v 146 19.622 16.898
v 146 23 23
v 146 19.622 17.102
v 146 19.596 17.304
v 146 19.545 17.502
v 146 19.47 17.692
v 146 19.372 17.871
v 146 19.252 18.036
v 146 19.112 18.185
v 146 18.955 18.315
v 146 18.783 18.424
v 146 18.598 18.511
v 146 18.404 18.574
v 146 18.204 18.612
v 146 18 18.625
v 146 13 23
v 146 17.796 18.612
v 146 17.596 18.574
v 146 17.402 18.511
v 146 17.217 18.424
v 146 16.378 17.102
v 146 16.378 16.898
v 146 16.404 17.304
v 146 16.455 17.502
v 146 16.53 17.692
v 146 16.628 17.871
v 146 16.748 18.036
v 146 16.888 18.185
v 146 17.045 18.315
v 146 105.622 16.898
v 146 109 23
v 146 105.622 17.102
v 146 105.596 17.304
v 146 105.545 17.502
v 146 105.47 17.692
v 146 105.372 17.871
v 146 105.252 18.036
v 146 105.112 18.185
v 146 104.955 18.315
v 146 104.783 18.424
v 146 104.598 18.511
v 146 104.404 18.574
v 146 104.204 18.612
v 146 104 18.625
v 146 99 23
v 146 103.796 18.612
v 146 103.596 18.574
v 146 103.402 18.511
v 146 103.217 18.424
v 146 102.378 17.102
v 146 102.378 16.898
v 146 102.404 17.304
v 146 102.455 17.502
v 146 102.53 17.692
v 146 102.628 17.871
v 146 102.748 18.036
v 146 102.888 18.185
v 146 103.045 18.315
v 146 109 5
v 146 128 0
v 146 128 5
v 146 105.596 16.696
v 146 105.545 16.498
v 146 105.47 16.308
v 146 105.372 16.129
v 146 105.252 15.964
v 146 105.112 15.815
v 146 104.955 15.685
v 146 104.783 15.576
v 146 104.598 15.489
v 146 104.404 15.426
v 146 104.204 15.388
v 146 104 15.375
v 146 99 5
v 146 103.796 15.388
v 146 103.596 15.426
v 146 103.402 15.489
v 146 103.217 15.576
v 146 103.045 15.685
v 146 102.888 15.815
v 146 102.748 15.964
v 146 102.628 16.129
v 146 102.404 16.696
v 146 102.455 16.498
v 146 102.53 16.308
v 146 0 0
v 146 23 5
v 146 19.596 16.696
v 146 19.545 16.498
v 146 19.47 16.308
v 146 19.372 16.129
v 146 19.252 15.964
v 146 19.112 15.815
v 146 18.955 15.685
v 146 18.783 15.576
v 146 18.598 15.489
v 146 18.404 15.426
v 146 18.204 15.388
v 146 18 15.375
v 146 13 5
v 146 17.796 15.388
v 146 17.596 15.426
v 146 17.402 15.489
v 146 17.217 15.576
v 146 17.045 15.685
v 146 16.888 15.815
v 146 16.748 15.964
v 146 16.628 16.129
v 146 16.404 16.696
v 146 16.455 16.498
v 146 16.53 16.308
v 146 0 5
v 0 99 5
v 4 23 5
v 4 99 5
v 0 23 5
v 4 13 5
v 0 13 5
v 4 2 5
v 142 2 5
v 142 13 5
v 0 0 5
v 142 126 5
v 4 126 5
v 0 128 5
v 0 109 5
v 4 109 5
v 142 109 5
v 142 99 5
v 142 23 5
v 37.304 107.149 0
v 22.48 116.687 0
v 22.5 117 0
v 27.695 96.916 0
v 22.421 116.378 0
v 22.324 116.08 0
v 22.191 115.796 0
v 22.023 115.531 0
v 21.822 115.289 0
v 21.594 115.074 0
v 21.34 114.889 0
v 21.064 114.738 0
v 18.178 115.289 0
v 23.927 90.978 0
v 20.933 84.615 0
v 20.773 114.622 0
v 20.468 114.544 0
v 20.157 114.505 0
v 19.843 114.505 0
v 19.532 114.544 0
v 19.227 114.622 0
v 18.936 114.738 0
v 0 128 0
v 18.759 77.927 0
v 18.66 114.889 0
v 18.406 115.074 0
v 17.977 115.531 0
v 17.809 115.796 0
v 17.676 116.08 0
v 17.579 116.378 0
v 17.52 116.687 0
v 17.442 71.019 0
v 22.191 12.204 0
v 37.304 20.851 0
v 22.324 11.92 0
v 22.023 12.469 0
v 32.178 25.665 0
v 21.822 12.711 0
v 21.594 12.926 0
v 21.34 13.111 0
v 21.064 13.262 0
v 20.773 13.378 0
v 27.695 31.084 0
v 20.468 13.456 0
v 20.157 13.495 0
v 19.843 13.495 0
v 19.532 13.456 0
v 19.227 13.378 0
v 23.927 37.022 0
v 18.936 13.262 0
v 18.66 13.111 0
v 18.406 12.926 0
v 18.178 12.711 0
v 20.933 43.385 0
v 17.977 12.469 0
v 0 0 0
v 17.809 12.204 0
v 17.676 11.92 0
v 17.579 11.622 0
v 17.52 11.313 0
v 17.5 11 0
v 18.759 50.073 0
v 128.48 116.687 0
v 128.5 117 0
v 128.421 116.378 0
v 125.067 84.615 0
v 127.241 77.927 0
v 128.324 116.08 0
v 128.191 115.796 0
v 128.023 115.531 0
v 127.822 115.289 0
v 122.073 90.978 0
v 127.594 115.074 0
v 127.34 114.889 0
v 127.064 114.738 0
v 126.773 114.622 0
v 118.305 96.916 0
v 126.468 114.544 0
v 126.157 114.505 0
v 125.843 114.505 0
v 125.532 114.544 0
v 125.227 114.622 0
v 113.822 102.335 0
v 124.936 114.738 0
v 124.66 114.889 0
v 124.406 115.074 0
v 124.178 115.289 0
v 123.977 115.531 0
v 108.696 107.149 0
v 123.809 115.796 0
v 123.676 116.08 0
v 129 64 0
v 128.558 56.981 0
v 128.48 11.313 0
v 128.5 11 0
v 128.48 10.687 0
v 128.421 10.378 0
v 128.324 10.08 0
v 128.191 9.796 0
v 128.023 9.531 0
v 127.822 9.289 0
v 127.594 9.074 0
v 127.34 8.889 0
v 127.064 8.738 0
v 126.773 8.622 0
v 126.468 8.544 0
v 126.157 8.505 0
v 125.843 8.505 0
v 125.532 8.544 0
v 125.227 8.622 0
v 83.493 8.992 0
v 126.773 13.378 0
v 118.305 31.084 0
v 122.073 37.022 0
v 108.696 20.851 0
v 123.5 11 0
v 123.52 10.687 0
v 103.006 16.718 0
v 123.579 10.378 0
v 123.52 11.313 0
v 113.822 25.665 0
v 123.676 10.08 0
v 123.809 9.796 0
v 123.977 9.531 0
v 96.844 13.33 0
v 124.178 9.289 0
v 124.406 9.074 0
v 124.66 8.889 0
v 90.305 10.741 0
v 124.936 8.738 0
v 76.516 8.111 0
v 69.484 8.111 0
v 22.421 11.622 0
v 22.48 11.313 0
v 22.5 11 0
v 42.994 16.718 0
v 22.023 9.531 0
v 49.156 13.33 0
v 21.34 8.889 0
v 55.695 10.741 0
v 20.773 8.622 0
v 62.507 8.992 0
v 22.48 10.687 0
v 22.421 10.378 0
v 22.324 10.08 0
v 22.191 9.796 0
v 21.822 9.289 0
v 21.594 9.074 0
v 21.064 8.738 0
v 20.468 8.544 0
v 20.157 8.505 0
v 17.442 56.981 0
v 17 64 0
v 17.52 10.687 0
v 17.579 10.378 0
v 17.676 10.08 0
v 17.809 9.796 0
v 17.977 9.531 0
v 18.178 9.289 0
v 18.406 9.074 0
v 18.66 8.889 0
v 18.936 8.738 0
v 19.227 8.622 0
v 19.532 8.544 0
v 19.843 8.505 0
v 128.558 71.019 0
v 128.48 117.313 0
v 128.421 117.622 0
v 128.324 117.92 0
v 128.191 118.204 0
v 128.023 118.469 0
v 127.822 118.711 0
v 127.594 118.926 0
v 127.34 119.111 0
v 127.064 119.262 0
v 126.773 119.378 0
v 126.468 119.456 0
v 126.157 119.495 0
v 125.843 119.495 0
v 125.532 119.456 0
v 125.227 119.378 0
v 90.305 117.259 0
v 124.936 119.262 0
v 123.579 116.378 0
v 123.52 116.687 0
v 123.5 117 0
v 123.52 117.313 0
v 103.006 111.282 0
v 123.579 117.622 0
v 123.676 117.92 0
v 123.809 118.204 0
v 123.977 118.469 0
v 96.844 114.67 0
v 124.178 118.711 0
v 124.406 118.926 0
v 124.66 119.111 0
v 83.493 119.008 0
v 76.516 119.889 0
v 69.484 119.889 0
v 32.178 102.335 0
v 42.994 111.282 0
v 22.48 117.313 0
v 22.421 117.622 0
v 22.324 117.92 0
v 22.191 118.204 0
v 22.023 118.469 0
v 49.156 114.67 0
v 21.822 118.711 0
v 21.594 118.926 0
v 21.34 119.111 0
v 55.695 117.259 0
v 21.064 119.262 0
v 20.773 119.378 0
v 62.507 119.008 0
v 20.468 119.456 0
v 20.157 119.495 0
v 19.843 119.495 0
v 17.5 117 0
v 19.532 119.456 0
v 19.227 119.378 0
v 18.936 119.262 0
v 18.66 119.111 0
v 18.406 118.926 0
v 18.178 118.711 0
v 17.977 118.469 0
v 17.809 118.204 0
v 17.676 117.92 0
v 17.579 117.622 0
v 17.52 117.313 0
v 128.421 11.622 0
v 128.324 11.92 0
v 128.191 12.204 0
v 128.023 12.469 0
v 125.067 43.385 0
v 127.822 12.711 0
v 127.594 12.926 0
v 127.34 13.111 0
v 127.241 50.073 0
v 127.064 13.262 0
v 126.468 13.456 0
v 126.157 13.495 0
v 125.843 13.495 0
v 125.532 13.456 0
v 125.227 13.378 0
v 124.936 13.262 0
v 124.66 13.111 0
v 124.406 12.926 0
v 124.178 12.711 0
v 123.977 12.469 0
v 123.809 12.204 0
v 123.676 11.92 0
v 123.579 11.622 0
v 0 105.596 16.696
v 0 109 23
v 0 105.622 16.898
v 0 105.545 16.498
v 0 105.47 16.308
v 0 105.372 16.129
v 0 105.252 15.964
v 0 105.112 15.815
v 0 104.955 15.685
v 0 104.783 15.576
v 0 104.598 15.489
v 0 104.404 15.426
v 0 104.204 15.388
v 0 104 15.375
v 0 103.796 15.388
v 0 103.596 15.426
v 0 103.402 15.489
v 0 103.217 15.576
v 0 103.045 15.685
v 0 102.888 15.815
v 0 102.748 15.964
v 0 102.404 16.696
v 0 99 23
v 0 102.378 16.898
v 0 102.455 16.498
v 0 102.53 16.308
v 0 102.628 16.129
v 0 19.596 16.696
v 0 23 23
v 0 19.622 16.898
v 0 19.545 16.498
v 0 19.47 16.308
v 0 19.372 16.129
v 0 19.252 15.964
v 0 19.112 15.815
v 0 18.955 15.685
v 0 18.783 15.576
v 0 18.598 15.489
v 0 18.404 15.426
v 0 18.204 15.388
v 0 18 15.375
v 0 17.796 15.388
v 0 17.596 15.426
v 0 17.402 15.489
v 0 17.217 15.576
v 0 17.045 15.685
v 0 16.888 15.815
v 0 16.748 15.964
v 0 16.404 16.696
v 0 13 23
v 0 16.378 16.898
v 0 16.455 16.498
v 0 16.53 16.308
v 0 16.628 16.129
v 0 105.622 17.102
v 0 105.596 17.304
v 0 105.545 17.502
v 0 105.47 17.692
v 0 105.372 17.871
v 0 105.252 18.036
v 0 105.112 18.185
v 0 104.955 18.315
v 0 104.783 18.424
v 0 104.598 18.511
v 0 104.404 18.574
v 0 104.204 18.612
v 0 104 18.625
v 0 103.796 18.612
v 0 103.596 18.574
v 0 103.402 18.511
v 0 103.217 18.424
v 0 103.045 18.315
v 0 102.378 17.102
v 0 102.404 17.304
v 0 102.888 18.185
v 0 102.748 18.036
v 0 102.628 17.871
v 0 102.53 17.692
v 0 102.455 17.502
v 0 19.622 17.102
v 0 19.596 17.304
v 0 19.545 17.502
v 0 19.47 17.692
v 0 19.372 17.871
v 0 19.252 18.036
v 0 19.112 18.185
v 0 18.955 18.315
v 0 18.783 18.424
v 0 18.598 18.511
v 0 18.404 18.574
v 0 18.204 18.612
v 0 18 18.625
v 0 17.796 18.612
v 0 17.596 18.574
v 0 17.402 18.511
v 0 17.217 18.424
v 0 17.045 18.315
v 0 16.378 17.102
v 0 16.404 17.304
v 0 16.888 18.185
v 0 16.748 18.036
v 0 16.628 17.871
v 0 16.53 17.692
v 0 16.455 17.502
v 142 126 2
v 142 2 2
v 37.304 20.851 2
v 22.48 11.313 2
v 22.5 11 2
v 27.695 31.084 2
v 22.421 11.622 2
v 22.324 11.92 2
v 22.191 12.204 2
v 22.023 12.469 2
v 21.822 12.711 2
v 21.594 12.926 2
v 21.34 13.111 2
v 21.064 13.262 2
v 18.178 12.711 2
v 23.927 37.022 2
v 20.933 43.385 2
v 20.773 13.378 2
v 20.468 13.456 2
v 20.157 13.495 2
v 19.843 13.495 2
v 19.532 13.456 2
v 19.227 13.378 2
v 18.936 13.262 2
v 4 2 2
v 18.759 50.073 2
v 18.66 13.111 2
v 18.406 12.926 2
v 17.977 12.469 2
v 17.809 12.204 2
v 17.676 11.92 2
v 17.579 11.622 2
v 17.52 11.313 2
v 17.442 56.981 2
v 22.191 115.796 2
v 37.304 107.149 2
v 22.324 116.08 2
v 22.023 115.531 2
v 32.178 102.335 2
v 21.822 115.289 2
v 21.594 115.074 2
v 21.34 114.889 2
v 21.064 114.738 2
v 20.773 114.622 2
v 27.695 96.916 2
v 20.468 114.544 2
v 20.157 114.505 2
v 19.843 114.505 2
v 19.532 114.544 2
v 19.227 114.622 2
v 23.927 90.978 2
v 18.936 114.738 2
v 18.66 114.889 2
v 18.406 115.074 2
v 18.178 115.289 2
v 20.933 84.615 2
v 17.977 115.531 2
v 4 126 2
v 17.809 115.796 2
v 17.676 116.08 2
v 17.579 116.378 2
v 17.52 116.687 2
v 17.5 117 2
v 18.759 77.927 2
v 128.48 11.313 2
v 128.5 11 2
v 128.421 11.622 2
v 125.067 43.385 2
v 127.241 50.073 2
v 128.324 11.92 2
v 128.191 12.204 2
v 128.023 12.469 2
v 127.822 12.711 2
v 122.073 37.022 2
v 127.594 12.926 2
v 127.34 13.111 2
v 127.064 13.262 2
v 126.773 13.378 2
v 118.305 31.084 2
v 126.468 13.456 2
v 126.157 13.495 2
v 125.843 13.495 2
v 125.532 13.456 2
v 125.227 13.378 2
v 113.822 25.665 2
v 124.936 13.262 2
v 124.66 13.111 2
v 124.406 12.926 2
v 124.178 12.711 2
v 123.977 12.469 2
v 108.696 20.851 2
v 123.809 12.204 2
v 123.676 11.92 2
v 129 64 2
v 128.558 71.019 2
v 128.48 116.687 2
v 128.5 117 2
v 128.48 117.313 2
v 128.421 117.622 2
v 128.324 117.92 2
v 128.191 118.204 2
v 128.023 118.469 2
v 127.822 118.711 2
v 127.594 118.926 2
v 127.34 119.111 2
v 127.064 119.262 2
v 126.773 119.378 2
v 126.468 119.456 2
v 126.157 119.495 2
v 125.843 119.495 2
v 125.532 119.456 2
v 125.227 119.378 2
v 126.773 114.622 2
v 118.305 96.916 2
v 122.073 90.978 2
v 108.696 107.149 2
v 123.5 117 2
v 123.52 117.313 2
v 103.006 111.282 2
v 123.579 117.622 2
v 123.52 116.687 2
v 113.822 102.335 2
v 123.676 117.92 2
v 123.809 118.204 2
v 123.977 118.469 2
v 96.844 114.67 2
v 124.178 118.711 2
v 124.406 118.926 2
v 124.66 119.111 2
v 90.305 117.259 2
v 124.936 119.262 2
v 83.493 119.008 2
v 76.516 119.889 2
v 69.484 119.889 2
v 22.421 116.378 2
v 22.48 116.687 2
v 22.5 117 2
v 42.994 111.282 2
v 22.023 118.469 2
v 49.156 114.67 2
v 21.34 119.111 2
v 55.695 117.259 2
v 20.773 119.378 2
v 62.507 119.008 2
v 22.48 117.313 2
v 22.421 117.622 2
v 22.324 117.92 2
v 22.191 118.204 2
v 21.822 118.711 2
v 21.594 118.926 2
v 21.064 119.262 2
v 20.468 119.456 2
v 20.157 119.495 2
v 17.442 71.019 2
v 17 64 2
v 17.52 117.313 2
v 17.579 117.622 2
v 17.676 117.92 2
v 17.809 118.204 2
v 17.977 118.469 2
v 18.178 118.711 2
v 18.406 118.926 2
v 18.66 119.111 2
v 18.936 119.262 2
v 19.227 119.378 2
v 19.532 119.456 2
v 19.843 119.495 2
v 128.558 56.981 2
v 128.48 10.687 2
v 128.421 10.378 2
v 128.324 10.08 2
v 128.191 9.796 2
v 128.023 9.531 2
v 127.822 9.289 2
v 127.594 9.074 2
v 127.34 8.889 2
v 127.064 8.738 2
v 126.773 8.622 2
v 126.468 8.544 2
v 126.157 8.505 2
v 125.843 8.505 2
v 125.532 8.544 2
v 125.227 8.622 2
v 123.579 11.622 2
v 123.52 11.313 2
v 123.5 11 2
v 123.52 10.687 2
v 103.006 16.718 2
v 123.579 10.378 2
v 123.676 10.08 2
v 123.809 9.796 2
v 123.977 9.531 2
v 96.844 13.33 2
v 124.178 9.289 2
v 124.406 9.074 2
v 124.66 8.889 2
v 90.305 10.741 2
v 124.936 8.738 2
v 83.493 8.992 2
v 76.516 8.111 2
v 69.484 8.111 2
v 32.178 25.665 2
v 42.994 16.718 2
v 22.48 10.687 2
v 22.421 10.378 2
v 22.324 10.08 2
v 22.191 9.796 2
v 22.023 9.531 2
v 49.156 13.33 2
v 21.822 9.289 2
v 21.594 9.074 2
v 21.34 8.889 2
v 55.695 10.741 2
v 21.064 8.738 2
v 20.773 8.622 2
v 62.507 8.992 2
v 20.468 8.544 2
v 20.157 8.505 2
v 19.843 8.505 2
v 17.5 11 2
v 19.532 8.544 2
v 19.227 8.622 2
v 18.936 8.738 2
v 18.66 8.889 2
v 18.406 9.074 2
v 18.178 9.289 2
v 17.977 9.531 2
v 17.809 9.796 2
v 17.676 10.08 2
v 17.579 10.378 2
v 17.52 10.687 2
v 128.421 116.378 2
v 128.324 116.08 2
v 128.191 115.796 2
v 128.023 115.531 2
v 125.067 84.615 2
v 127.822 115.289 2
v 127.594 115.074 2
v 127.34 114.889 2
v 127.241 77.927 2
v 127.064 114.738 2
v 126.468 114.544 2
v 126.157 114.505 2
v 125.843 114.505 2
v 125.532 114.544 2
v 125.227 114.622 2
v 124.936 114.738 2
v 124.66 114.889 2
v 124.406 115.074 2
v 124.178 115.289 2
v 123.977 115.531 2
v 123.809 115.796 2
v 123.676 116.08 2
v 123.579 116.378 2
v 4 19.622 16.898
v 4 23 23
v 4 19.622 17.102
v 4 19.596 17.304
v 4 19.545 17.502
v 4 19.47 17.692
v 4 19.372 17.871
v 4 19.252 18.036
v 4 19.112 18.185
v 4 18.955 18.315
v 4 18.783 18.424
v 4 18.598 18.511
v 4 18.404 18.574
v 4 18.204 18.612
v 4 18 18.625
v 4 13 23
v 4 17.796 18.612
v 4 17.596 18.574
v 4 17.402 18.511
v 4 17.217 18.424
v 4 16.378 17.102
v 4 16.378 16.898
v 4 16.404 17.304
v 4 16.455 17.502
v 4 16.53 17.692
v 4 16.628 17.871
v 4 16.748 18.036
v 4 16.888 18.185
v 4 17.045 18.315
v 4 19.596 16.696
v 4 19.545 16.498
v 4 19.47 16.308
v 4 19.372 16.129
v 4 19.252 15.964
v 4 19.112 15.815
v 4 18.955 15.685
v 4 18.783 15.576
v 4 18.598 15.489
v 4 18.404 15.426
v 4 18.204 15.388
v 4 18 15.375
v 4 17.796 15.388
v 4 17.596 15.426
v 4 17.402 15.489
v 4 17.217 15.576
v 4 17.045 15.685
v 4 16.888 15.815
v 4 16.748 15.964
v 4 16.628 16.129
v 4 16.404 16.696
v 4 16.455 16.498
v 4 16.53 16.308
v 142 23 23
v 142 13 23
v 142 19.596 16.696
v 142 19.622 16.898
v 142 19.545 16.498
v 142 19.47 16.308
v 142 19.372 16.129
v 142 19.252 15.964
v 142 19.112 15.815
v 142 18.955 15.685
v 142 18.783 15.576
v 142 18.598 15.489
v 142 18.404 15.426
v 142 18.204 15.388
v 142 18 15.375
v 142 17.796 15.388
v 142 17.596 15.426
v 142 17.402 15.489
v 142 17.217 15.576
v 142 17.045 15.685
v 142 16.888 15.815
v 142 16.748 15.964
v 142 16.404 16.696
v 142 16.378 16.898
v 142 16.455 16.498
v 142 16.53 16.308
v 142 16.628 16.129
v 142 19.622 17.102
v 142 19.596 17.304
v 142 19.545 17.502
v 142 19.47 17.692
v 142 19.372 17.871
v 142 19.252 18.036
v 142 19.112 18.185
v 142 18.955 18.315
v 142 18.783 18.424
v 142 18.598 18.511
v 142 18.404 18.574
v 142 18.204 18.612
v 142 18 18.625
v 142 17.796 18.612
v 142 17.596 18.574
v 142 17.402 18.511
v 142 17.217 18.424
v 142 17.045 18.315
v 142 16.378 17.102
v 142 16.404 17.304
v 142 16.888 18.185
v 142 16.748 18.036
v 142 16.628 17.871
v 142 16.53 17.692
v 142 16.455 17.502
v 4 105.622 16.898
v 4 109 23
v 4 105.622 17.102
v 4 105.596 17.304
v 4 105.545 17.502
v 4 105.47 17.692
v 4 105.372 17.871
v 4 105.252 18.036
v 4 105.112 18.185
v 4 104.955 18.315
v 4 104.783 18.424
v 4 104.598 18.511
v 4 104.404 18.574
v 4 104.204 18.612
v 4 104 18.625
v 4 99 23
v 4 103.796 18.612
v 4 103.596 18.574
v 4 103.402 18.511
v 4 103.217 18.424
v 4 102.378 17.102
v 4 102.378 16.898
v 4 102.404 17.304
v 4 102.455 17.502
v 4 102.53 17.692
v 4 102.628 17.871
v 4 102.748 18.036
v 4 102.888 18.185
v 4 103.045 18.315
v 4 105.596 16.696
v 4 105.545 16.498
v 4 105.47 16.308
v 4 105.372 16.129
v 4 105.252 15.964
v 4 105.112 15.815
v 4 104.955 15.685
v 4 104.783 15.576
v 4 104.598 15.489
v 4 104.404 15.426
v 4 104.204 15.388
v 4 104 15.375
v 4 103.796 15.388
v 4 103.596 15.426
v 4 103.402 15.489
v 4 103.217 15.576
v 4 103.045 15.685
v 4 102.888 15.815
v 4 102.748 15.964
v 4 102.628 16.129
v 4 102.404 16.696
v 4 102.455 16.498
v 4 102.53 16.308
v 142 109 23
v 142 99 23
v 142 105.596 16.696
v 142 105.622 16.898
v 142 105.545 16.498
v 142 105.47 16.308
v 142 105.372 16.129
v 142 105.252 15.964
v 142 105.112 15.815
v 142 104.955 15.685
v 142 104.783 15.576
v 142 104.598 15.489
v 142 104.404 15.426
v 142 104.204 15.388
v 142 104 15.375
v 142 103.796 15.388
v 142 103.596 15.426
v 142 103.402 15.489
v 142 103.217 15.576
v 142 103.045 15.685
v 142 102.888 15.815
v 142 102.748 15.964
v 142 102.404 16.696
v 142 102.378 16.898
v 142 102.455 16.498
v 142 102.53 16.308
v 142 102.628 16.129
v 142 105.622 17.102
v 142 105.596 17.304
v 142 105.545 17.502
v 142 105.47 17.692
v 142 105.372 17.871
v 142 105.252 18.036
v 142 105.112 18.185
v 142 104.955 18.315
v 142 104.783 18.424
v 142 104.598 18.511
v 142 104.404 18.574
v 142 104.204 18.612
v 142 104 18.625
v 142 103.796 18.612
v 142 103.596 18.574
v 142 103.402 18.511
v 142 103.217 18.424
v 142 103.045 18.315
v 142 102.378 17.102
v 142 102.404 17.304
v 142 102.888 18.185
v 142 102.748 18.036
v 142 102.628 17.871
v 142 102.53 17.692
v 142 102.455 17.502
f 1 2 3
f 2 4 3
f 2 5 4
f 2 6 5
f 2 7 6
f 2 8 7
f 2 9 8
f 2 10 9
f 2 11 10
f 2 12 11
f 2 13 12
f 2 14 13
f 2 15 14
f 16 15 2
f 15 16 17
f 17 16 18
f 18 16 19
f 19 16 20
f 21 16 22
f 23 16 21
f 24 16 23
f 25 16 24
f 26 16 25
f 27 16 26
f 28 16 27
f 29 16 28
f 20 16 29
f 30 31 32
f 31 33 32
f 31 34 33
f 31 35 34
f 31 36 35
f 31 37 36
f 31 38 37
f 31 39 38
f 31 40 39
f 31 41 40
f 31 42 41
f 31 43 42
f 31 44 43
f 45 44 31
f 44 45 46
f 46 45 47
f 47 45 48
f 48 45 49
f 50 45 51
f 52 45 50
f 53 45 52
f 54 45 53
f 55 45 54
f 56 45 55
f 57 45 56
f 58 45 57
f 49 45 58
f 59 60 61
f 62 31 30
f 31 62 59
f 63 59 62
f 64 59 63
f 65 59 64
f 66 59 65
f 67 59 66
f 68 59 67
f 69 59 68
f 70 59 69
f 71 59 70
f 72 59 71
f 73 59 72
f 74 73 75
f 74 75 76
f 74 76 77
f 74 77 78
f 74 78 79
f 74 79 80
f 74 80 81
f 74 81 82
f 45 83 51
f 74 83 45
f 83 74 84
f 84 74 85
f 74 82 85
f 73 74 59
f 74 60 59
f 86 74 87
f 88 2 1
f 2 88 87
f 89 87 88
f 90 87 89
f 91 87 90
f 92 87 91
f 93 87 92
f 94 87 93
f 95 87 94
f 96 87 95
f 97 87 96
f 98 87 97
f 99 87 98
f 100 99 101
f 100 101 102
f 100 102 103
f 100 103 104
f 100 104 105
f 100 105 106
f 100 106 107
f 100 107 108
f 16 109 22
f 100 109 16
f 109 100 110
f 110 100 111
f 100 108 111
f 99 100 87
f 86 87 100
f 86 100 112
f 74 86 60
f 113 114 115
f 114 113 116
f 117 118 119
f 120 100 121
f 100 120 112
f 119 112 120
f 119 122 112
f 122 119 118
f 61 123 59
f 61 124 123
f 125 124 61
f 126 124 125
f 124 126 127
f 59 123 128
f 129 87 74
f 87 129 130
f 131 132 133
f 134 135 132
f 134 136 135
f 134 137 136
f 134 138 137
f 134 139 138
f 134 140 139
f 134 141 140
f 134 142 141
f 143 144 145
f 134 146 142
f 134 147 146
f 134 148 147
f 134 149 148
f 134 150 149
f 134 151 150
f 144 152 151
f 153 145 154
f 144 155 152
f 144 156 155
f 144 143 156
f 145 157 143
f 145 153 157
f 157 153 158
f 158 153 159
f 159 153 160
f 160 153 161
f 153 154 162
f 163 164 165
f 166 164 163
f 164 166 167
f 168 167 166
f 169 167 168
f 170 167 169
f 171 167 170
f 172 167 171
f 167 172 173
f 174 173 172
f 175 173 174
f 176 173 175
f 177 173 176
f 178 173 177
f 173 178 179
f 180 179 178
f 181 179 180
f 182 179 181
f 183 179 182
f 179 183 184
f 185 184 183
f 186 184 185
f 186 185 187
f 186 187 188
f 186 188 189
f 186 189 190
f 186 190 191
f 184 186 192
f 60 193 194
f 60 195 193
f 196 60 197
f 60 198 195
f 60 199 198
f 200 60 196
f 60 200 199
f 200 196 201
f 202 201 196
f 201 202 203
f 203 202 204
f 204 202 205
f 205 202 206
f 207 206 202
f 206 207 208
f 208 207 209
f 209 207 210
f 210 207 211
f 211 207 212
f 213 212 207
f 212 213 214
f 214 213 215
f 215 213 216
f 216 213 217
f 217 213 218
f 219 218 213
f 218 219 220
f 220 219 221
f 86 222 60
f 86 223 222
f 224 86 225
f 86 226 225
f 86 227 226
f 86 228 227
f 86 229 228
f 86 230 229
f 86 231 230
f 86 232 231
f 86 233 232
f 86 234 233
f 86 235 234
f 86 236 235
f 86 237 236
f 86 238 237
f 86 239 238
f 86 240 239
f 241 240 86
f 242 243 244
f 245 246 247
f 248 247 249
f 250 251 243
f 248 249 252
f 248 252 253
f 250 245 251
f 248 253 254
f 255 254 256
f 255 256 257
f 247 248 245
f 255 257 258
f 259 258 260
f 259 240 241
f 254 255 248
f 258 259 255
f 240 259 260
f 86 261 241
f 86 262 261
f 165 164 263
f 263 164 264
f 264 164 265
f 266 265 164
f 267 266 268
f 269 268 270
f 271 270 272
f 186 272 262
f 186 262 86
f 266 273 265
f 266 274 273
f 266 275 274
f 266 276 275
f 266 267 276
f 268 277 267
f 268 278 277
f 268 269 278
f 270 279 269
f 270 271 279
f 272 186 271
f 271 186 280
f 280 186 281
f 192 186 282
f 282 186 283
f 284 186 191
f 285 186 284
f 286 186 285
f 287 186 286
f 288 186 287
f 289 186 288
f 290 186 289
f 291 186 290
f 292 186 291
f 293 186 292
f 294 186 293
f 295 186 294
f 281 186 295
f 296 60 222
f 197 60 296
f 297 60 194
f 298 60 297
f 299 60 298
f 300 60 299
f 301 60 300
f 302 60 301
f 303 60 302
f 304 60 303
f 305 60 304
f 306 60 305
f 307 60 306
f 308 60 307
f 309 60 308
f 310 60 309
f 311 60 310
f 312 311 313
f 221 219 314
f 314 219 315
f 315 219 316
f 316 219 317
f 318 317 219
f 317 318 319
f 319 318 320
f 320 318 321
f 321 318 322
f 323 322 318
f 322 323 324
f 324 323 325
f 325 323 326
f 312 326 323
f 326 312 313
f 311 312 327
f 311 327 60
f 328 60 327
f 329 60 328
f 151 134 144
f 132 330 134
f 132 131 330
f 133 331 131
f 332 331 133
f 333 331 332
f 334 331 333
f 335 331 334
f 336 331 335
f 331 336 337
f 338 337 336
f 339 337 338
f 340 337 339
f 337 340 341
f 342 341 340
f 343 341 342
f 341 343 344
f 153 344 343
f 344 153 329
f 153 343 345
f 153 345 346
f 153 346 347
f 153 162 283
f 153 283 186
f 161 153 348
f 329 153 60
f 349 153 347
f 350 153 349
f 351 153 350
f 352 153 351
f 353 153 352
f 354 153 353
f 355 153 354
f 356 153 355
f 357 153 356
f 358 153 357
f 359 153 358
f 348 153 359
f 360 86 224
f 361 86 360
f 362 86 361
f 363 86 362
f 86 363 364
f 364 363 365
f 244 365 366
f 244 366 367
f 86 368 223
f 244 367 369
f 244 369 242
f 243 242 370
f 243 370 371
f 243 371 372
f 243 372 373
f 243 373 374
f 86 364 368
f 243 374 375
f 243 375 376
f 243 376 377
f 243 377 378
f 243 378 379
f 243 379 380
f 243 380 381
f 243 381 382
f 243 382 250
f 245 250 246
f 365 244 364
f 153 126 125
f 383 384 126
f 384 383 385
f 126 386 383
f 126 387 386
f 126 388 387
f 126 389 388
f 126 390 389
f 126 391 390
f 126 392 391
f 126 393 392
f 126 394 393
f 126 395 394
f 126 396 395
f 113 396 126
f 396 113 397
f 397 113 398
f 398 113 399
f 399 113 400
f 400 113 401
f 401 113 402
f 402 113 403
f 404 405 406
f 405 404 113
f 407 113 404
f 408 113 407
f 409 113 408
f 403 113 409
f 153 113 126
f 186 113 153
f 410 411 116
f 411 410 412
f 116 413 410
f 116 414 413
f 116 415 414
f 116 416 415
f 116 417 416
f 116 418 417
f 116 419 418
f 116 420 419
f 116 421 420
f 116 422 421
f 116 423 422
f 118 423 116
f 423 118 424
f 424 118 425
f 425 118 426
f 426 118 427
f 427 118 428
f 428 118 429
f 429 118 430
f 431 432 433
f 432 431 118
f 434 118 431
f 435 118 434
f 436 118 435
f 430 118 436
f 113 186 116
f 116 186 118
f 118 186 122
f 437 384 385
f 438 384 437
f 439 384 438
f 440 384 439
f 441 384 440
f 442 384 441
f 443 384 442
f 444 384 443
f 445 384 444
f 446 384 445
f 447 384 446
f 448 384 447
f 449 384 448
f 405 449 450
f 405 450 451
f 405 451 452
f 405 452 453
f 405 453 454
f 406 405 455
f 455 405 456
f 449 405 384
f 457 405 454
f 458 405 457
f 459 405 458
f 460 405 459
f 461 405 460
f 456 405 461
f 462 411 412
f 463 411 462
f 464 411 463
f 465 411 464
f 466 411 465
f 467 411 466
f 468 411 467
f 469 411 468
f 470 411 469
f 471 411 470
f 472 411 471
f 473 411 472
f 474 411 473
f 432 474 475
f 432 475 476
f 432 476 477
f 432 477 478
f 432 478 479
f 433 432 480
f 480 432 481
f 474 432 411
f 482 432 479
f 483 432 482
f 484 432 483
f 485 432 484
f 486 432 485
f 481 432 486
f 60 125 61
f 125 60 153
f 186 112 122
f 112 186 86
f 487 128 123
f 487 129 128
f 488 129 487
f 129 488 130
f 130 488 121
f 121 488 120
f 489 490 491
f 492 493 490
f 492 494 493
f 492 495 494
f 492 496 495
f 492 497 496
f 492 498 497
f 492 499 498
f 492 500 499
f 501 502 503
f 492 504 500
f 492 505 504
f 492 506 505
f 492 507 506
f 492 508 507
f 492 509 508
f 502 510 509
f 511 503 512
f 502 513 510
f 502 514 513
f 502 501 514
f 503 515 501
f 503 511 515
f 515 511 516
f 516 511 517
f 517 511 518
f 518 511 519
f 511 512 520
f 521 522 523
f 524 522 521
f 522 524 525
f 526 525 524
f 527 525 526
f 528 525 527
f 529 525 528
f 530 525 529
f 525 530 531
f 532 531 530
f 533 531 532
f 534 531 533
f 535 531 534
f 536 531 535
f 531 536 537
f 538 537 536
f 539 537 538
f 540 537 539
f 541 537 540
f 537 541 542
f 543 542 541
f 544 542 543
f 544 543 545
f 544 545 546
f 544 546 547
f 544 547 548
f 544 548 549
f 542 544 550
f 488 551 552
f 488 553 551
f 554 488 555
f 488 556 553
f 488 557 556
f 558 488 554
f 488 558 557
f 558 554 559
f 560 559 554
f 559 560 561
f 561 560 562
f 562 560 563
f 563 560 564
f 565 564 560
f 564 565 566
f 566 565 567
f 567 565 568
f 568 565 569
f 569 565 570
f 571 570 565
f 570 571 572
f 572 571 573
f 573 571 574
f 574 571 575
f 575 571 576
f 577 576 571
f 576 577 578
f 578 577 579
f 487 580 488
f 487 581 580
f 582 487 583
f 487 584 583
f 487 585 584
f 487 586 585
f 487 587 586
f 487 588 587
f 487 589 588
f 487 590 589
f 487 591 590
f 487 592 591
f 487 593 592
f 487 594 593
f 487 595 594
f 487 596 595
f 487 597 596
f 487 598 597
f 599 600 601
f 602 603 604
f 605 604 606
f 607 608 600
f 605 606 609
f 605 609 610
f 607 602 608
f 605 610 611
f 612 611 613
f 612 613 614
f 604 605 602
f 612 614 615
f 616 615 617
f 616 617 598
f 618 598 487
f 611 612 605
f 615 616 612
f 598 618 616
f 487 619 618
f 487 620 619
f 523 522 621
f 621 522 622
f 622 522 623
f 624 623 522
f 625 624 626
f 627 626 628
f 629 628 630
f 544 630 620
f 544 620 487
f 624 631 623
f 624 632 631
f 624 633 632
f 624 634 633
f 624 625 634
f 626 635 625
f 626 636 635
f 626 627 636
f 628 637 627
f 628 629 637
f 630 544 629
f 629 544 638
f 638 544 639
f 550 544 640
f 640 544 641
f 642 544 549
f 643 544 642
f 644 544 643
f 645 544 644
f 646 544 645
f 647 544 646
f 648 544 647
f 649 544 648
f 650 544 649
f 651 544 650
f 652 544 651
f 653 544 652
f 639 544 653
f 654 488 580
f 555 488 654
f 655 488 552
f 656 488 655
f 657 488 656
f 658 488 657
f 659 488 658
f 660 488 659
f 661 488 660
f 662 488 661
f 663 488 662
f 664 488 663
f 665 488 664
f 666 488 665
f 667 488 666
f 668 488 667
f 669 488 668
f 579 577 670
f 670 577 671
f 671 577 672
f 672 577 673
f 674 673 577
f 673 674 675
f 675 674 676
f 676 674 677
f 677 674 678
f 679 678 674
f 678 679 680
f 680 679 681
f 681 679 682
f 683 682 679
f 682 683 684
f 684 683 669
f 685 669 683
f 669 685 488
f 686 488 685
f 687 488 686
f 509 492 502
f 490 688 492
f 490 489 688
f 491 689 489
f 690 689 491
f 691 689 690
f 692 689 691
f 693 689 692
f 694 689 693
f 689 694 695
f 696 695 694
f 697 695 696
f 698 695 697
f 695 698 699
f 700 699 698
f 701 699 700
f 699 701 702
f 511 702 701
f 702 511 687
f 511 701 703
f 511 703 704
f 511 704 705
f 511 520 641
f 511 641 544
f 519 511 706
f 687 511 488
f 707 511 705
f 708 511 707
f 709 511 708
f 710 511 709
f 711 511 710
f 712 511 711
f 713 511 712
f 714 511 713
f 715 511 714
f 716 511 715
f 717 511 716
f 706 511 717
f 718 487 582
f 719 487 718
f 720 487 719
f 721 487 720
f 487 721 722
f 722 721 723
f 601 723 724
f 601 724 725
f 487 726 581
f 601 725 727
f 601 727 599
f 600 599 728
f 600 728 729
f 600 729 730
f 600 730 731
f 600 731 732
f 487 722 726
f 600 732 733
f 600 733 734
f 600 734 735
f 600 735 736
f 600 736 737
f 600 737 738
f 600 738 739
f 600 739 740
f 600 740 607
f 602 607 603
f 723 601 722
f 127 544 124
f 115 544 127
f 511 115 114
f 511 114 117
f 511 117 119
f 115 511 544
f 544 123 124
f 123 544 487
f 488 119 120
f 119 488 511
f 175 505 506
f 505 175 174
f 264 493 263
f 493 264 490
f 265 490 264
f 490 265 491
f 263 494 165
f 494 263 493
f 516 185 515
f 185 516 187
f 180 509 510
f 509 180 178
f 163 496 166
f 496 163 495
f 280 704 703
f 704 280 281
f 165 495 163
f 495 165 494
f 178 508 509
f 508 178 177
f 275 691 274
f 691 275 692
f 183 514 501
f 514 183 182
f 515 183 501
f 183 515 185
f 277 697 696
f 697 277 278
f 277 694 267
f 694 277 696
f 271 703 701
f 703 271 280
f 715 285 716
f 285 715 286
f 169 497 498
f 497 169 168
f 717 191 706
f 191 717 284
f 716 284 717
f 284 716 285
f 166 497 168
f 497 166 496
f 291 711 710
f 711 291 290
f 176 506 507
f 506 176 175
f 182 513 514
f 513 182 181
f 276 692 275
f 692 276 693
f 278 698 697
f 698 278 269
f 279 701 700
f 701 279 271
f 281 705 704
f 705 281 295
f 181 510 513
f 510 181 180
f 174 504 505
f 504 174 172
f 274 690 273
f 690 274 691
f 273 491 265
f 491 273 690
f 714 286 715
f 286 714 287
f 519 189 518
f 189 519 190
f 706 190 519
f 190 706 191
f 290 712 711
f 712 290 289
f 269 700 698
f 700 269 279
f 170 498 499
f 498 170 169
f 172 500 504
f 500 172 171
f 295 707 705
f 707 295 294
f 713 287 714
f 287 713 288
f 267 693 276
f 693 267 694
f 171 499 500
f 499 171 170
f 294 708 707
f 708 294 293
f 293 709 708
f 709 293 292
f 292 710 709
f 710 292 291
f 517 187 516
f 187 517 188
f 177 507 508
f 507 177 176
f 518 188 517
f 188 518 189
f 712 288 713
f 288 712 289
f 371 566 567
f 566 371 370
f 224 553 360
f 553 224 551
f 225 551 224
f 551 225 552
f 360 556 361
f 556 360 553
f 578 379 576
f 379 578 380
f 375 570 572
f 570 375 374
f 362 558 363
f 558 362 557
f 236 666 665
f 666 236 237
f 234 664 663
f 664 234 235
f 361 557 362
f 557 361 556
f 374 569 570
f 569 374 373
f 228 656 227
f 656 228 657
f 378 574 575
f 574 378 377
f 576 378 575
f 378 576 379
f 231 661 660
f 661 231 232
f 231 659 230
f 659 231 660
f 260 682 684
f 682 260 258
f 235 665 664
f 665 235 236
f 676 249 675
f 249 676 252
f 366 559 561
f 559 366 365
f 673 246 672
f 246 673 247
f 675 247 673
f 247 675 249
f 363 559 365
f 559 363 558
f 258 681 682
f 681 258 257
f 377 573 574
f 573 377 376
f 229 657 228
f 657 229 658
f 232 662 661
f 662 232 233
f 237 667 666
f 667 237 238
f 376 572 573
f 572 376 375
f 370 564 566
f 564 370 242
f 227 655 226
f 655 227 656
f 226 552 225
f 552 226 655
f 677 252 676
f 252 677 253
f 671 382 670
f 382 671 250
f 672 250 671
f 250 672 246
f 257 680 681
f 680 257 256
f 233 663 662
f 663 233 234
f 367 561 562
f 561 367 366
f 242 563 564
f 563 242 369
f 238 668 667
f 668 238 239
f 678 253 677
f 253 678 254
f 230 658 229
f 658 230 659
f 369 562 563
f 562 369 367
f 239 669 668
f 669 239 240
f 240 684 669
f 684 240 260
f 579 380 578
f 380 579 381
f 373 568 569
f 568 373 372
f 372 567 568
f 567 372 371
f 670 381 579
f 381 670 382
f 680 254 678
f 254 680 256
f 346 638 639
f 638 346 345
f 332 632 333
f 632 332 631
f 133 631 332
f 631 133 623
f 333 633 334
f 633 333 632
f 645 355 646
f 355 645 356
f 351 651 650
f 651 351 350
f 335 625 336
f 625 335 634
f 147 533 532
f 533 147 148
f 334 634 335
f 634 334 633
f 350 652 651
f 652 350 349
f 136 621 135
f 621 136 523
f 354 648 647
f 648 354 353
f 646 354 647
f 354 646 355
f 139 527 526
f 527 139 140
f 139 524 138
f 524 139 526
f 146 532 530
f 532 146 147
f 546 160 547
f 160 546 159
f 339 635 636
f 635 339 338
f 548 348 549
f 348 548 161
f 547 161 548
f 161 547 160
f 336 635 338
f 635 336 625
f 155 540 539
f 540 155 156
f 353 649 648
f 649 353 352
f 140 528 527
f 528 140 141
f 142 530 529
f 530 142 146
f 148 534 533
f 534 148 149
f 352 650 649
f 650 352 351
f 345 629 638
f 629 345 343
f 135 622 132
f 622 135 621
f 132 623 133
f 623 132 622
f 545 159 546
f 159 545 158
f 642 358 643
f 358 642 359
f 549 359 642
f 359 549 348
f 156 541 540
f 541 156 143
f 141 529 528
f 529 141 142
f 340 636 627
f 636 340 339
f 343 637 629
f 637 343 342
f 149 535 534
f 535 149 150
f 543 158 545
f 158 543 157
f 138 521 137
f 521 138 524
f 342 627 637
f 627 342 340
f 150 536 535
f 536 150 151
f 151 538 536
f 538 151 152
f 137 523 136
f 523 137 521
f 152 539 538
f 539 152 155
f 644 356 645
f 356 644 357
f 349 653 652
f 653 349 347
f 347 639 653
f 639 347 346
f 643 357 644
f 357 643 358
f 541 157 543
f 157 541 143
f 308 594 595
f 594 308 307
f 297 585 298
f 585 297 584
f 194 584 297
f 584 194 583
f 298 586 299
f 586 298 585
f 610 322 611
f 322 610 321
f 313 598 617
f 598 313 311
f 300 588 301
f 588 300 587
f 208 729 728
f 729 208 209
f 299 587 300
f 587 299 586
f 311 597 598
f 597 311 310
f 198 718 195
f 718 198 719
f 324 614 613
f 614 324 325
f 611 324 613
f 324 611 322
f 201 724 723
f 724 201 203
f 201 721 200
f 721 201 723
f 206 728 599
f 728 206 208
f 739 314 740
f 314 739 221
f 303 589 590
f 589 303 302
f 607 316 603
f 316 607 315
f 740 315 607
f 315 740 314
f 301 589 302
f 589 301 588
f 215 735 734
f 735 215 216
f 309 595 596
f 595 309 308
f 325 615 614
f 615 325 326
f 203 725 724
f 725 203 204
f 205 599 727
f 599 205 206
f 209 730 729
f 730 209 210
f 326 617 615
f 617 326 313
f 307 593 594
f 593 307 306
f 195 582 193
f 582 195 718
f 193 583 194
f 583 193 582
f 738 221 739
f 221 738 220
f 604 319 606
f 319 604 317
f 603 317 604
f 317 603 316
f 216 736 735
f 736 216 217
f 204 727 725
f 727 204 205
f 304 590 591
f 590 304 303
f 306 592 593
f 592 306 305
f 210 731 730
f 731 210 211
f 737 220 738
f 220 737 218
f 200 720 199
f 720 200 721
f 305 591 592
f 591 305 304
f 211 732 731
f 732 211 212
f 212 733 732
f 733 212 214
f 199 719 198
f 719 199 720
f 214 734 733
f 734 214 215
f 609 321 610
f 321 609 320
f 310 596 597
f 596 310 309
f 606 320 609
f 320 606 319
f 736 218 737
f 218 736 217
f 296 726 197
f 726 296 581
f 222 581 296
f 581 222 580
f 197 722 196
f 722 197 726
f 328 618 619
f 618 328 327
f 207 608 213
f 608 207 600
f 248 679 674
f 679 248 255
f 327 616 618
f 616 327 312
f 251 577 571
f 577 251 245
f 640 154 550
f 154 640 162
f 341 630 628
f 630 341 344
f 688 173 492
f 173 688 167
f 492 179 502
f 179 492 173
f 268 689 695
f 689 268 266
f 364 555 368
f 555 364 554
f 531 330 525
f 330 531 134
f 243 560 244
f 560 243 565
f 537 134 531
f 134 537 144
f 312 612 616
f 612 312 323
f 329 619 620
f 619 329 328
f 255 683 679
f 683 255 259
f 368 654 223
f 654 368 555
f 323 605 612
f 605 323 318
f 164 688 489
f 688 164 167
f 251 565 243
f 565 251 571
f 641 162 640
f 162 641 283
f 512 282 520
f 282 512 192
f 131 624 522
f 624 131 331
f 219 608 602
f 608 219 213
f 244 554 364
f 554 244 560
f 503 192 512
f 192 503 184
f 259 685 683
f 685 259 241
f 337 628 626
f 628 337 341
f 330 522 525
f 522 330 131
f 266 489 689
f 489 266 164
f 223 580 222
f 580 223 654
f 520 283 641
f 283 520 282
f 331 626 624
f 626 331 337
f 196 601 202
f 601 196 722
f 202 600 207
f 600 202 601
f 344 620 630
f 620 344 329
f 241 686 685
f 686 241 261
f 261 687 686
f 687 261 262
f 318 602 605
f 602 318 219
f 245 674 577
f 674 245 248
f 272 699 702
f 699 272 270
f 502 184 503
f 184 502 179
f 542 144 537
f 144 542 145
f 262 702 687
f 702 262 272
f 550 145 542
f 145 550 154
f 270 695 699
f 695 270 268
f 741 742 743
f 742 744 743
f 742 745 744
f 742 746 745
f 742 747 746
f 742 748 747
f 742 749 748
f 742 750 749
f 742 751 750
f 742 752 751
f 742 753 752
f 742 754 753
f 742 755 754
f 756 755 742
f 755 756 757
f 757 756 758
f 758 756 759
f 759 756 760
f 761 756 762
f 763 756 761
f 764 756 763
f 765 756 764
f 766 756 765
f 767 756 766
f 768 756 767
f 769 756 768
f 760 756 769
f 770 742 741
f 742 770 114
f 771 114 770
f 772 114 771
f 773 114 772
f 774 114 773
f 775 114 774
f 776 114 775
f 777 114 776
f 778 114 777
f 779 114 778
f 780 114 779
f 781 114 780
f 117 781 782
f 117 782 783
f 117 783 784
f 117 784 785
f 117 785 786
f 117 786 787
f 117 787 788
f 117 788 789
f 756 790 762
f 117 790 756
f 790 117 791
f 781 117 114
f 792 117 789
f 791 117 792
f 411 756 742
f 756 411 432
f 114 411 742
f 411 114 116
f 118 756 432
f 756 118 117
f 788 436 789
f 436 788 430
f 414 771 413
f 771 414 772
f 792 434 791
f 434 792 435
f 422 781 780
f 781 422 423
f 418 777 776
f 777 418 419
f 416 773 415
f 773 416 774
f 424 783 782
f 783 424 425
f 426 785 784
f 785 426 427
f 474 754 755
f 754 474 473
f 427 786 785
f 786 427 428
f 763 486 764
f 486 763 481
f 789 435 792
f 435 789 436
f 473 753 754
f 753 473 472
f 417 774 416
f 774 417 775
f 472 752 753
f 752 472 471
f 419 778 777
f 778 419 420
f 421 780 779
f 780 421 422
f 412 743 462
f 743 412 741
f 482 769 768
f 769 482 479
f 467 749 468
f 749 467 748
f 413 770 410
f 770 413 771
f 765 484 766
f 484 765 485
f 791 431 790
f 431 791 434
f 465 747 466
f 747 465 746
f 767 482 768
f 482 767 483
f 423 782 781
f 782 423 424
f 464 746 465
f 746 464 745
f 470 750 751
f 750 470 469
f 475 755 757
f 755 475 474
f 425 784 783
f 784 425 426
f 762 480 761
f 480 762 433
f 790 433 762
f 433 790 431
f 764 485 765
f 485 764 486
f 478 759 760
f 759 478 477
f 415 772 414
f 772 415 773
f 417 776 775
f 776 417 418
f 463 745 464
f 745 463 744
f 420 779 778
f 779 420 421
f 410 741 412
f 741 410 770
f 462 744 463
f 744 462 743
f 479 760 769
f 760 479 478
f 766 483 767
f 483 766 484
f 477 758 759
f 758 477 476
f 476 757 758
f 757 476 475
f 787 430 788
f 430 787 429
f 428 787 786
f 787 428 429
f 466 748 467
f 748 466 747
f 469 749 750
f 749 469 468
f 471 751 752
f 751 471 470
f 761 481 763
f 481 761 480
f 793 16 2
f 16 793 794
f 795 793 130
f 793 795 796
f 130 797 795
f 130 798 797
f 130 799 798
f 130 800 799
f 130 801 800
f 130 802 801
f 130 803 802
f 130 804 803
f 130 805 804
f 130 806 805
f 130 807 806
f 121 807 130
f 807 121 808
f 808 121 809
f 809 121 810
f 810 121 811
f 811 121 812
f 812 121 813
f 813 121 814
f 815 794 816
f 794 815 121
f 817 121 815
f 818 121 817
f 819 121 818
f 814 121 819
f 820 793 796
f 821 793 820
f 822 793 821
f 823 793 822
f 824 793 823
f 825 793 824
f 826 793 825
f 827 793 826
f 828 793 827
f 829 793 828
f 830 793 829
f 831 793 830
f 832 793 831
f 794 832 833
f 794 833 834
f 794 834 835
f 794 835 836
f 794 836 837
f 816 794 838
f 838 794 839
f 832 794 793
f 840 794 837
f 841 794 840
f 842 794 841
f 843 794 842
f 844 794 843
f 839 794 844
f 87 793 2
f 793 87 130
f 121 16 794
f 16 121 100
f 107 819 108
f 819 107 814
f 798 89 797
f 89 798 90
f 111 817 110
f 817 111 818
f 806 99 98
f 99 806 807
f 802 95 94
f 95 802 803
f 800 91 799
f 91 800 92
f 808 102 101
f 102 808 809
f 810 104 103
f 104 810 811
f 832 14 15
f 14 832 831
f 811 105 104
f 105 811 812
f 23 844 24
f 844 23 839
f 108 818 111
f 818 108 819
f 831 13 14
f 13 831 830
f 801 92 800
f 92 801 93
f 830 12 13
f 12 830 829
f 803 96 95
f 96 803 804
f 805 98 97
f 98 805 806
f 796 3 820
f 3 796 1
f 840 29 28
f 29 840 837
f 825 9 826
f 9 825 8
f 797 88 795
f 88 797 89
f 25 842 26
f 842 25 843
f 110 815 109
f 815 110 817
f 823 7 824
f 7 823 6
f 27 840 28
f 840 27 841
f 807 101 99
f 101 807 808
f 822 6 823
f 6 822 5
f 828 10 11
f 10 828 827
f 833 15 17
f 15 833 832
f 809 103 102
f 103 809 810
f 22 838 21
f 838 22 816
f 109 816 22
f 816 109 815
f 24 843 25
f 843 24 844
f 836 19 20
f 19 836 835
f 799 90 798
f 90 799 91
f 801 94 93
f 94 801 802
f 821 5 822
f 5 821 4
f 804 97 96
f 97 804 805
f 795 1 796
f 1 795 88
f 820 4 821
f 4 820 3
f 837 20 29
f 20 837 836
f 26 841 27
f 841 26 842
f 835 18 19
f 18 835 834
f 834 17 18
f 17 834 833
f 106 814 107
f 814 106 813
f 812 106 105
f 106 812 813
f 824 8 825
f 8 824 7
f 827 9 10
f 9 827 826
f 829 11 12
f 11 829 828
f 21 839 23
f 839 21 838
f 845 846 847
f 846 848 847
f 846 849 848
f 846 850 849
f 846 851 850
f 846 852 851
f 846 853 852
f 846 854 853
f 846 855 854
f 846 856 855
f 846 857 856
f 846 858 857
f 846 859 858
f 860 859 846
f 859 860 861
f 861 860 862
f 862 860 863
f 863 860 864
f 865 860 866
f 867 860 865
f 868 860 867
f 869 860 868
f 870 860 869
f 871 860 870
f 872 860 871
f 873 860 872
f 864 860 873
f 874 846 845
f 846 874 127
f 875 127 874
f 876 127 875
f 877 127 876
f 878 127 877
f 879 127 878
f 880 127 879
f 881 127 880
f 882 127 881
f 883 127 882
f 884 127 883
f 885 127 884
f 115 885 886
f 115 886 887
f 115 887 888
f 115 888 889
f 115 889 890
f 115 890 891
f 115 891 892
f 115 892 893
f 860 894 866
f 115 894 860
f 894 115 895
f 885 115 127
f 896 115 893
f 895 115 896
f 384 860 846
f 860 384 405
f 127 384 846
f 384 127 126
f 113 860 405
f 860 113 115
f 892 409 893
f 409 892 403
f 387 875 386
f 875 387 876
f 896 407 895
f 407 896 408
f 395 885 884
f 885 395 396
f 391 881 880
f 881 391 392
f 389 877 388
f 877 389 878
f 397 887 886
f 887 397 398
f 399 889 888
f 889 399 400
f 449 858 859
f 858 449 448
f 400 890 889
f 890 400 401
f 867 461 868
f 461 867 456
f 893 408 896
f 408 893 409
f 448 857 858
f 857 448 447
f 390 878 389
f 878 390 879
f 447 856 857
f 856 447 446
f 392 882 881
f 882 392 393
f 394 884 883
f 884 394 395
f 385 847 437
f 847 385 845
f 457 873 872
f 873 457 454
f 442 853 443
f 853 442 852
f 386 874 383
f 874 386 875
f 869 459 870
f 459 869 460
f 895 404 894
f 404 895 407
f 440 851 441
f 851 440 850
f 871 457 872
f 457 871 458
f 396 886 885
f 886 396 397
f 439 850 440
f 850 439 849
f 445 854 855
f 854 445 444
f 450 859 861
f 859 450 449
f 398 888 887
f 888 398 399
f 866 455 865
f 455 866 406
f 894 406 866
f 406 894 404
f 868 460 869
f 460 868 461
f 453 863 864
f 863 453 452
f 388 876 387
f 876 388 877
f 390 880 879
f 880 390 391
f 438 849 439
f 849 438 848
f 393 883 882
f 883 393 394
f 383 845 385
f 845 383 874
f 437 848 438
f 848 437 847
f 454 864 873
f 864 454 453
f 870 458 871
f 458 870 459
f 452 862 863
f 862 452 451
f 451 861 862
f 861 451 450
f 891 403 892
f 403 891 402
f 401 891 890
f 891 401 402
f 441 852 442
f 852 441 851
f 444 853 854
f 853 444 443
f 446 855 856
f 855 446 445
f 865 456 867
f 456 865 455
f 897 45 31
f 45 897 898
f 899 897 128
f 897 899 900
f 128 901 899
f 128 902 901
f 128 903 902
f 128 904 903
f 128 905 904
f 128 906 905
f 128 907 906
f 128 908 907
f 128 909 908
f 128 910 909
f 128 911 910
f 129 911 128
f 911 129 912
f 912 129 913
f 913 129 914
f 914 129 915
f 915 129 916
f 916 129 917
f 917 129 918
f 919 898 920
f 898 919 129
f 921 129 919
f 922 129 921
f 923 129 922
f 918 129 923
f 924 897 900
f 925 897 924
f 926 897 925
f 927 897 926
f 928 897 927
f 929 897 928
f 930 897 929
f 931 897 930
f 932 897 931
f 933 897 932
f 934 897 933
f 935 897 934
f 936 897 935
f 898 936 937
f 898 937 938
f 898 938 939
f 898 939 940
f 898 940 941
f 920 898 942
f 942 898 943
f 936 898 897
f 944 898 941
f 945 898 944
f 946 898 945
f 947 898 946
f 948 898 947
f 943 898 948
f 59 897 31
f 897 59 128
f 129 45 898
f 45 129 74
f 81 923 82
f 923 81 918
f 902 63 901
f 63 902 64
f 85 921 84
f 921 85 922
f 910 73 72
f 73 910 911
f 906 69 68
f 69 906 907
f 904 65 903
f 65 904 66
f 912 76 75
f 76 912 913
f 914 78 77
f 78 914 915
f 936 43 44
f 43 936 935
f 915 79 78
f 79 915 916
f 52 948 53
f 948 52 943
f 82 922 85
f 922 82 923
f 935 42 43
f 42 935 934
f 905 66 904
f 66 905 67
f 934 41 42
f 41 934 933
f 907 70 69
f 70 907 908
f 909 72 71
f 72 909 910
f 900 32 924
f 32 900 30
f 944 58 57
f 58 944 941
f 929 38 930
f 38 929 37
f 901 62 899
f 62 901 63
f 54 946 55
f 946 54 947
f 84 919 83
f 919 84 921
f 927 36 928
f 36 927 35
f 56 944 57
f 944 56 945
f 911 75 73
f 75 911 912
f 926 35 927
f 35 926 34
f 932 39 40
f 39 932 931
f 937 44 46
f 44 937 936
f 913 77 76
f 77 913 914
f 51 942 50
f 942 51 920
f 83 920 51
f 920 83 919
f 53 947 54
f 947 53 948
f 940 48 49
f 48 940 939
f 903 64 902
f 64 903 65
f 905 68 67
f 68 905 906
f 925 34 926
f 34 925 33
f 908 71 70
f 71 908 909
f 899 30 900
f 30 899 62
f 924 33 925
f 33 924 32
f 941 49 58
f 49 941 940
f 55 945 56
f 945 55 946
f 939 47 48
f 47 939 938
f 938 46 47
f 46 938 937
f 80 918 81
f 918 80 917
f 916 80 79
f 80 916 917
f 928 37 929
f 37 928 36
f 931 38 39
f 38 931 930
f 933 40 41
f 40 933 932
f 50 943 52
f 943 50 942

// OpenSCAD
fanw=146;//bracket width
fanh=128;//bracket height
fant=2;//bracket thickness
fanet=5;//bracket edge thickness
fanew=4;//bracket edge width
faneh=2;//bracket edge height
fand=112; //fan diameter
holespace=106;//fan screw hole spacing
holed=5;//fan screw hole diameter

mscrewh=23;
mscrewd=17;
mbh=23;
mbw=10;
mholed=3.25;
mbh2o=86;

$fn=50;
//mountbs();
//mountbsw();
//mountb();
//fanhole();
bracket();
//plate();
module bracket(){
    difference() {
        plate();
        fanhole();
        fanshole();
    }
    mountbs();
}
module fanshole(){
    translate([(fanw-holespace)/2,(fanh-holespace)/2,0])fscrew();
    translate([(fanw-holespace)/2+holespace,(fanh-holespace)/2,0])fscrew();
    translate([(fanw-holespace)/2,(fanh-holespace)/2+holespace,0])fscrew();
    translate([(fanw-holespace)/2+holespace,(fanh-holespace)/2+holespace,0])fscrew();
    
}
module fanhole(){
    translate([fanw/2,fanh/2,fant/2])cylinder(h=fant, r1=fand/2, r2=fand/2, center=true);
    
}
module plate() {
    difference(){
        cube([fanw,fanh,fanet]);
        translate([fanew,faneh,fant])cube([fanw-2*fanew,fanh-2*faneh,fanet-fant]);
    }
}
module fscrew(){
    translate([0,0,fant/2])cylinder(h=fant,r1=holed/2,r2=holed/2,center=true);
}

module mountbs(){
    translate([0,mscrewh-mbw,fanet])mountb();
    translate([fanw-fanew,mscrewh-mbw,fanet])mountb();
    translate([0,mscrewh-mbw+mbh2o,fanet])mountb();
    translate([fanw-fanew,mscrewh-mbw+mbh2o,fanet])mountb();
}
module mountbsw(){
    translate([fanew/2,0,0])rotate([0,90,0])cylinder(h=fanew,r1=mholed/2,r2=mholed/2,center=true);
    
}
module mountb(){
    difference(){
        cube([fanew,mbw,mbh-fanet]);
        translate([0,mbw/2,mscrewd-fanet])mountbsw();
        
    }
}
